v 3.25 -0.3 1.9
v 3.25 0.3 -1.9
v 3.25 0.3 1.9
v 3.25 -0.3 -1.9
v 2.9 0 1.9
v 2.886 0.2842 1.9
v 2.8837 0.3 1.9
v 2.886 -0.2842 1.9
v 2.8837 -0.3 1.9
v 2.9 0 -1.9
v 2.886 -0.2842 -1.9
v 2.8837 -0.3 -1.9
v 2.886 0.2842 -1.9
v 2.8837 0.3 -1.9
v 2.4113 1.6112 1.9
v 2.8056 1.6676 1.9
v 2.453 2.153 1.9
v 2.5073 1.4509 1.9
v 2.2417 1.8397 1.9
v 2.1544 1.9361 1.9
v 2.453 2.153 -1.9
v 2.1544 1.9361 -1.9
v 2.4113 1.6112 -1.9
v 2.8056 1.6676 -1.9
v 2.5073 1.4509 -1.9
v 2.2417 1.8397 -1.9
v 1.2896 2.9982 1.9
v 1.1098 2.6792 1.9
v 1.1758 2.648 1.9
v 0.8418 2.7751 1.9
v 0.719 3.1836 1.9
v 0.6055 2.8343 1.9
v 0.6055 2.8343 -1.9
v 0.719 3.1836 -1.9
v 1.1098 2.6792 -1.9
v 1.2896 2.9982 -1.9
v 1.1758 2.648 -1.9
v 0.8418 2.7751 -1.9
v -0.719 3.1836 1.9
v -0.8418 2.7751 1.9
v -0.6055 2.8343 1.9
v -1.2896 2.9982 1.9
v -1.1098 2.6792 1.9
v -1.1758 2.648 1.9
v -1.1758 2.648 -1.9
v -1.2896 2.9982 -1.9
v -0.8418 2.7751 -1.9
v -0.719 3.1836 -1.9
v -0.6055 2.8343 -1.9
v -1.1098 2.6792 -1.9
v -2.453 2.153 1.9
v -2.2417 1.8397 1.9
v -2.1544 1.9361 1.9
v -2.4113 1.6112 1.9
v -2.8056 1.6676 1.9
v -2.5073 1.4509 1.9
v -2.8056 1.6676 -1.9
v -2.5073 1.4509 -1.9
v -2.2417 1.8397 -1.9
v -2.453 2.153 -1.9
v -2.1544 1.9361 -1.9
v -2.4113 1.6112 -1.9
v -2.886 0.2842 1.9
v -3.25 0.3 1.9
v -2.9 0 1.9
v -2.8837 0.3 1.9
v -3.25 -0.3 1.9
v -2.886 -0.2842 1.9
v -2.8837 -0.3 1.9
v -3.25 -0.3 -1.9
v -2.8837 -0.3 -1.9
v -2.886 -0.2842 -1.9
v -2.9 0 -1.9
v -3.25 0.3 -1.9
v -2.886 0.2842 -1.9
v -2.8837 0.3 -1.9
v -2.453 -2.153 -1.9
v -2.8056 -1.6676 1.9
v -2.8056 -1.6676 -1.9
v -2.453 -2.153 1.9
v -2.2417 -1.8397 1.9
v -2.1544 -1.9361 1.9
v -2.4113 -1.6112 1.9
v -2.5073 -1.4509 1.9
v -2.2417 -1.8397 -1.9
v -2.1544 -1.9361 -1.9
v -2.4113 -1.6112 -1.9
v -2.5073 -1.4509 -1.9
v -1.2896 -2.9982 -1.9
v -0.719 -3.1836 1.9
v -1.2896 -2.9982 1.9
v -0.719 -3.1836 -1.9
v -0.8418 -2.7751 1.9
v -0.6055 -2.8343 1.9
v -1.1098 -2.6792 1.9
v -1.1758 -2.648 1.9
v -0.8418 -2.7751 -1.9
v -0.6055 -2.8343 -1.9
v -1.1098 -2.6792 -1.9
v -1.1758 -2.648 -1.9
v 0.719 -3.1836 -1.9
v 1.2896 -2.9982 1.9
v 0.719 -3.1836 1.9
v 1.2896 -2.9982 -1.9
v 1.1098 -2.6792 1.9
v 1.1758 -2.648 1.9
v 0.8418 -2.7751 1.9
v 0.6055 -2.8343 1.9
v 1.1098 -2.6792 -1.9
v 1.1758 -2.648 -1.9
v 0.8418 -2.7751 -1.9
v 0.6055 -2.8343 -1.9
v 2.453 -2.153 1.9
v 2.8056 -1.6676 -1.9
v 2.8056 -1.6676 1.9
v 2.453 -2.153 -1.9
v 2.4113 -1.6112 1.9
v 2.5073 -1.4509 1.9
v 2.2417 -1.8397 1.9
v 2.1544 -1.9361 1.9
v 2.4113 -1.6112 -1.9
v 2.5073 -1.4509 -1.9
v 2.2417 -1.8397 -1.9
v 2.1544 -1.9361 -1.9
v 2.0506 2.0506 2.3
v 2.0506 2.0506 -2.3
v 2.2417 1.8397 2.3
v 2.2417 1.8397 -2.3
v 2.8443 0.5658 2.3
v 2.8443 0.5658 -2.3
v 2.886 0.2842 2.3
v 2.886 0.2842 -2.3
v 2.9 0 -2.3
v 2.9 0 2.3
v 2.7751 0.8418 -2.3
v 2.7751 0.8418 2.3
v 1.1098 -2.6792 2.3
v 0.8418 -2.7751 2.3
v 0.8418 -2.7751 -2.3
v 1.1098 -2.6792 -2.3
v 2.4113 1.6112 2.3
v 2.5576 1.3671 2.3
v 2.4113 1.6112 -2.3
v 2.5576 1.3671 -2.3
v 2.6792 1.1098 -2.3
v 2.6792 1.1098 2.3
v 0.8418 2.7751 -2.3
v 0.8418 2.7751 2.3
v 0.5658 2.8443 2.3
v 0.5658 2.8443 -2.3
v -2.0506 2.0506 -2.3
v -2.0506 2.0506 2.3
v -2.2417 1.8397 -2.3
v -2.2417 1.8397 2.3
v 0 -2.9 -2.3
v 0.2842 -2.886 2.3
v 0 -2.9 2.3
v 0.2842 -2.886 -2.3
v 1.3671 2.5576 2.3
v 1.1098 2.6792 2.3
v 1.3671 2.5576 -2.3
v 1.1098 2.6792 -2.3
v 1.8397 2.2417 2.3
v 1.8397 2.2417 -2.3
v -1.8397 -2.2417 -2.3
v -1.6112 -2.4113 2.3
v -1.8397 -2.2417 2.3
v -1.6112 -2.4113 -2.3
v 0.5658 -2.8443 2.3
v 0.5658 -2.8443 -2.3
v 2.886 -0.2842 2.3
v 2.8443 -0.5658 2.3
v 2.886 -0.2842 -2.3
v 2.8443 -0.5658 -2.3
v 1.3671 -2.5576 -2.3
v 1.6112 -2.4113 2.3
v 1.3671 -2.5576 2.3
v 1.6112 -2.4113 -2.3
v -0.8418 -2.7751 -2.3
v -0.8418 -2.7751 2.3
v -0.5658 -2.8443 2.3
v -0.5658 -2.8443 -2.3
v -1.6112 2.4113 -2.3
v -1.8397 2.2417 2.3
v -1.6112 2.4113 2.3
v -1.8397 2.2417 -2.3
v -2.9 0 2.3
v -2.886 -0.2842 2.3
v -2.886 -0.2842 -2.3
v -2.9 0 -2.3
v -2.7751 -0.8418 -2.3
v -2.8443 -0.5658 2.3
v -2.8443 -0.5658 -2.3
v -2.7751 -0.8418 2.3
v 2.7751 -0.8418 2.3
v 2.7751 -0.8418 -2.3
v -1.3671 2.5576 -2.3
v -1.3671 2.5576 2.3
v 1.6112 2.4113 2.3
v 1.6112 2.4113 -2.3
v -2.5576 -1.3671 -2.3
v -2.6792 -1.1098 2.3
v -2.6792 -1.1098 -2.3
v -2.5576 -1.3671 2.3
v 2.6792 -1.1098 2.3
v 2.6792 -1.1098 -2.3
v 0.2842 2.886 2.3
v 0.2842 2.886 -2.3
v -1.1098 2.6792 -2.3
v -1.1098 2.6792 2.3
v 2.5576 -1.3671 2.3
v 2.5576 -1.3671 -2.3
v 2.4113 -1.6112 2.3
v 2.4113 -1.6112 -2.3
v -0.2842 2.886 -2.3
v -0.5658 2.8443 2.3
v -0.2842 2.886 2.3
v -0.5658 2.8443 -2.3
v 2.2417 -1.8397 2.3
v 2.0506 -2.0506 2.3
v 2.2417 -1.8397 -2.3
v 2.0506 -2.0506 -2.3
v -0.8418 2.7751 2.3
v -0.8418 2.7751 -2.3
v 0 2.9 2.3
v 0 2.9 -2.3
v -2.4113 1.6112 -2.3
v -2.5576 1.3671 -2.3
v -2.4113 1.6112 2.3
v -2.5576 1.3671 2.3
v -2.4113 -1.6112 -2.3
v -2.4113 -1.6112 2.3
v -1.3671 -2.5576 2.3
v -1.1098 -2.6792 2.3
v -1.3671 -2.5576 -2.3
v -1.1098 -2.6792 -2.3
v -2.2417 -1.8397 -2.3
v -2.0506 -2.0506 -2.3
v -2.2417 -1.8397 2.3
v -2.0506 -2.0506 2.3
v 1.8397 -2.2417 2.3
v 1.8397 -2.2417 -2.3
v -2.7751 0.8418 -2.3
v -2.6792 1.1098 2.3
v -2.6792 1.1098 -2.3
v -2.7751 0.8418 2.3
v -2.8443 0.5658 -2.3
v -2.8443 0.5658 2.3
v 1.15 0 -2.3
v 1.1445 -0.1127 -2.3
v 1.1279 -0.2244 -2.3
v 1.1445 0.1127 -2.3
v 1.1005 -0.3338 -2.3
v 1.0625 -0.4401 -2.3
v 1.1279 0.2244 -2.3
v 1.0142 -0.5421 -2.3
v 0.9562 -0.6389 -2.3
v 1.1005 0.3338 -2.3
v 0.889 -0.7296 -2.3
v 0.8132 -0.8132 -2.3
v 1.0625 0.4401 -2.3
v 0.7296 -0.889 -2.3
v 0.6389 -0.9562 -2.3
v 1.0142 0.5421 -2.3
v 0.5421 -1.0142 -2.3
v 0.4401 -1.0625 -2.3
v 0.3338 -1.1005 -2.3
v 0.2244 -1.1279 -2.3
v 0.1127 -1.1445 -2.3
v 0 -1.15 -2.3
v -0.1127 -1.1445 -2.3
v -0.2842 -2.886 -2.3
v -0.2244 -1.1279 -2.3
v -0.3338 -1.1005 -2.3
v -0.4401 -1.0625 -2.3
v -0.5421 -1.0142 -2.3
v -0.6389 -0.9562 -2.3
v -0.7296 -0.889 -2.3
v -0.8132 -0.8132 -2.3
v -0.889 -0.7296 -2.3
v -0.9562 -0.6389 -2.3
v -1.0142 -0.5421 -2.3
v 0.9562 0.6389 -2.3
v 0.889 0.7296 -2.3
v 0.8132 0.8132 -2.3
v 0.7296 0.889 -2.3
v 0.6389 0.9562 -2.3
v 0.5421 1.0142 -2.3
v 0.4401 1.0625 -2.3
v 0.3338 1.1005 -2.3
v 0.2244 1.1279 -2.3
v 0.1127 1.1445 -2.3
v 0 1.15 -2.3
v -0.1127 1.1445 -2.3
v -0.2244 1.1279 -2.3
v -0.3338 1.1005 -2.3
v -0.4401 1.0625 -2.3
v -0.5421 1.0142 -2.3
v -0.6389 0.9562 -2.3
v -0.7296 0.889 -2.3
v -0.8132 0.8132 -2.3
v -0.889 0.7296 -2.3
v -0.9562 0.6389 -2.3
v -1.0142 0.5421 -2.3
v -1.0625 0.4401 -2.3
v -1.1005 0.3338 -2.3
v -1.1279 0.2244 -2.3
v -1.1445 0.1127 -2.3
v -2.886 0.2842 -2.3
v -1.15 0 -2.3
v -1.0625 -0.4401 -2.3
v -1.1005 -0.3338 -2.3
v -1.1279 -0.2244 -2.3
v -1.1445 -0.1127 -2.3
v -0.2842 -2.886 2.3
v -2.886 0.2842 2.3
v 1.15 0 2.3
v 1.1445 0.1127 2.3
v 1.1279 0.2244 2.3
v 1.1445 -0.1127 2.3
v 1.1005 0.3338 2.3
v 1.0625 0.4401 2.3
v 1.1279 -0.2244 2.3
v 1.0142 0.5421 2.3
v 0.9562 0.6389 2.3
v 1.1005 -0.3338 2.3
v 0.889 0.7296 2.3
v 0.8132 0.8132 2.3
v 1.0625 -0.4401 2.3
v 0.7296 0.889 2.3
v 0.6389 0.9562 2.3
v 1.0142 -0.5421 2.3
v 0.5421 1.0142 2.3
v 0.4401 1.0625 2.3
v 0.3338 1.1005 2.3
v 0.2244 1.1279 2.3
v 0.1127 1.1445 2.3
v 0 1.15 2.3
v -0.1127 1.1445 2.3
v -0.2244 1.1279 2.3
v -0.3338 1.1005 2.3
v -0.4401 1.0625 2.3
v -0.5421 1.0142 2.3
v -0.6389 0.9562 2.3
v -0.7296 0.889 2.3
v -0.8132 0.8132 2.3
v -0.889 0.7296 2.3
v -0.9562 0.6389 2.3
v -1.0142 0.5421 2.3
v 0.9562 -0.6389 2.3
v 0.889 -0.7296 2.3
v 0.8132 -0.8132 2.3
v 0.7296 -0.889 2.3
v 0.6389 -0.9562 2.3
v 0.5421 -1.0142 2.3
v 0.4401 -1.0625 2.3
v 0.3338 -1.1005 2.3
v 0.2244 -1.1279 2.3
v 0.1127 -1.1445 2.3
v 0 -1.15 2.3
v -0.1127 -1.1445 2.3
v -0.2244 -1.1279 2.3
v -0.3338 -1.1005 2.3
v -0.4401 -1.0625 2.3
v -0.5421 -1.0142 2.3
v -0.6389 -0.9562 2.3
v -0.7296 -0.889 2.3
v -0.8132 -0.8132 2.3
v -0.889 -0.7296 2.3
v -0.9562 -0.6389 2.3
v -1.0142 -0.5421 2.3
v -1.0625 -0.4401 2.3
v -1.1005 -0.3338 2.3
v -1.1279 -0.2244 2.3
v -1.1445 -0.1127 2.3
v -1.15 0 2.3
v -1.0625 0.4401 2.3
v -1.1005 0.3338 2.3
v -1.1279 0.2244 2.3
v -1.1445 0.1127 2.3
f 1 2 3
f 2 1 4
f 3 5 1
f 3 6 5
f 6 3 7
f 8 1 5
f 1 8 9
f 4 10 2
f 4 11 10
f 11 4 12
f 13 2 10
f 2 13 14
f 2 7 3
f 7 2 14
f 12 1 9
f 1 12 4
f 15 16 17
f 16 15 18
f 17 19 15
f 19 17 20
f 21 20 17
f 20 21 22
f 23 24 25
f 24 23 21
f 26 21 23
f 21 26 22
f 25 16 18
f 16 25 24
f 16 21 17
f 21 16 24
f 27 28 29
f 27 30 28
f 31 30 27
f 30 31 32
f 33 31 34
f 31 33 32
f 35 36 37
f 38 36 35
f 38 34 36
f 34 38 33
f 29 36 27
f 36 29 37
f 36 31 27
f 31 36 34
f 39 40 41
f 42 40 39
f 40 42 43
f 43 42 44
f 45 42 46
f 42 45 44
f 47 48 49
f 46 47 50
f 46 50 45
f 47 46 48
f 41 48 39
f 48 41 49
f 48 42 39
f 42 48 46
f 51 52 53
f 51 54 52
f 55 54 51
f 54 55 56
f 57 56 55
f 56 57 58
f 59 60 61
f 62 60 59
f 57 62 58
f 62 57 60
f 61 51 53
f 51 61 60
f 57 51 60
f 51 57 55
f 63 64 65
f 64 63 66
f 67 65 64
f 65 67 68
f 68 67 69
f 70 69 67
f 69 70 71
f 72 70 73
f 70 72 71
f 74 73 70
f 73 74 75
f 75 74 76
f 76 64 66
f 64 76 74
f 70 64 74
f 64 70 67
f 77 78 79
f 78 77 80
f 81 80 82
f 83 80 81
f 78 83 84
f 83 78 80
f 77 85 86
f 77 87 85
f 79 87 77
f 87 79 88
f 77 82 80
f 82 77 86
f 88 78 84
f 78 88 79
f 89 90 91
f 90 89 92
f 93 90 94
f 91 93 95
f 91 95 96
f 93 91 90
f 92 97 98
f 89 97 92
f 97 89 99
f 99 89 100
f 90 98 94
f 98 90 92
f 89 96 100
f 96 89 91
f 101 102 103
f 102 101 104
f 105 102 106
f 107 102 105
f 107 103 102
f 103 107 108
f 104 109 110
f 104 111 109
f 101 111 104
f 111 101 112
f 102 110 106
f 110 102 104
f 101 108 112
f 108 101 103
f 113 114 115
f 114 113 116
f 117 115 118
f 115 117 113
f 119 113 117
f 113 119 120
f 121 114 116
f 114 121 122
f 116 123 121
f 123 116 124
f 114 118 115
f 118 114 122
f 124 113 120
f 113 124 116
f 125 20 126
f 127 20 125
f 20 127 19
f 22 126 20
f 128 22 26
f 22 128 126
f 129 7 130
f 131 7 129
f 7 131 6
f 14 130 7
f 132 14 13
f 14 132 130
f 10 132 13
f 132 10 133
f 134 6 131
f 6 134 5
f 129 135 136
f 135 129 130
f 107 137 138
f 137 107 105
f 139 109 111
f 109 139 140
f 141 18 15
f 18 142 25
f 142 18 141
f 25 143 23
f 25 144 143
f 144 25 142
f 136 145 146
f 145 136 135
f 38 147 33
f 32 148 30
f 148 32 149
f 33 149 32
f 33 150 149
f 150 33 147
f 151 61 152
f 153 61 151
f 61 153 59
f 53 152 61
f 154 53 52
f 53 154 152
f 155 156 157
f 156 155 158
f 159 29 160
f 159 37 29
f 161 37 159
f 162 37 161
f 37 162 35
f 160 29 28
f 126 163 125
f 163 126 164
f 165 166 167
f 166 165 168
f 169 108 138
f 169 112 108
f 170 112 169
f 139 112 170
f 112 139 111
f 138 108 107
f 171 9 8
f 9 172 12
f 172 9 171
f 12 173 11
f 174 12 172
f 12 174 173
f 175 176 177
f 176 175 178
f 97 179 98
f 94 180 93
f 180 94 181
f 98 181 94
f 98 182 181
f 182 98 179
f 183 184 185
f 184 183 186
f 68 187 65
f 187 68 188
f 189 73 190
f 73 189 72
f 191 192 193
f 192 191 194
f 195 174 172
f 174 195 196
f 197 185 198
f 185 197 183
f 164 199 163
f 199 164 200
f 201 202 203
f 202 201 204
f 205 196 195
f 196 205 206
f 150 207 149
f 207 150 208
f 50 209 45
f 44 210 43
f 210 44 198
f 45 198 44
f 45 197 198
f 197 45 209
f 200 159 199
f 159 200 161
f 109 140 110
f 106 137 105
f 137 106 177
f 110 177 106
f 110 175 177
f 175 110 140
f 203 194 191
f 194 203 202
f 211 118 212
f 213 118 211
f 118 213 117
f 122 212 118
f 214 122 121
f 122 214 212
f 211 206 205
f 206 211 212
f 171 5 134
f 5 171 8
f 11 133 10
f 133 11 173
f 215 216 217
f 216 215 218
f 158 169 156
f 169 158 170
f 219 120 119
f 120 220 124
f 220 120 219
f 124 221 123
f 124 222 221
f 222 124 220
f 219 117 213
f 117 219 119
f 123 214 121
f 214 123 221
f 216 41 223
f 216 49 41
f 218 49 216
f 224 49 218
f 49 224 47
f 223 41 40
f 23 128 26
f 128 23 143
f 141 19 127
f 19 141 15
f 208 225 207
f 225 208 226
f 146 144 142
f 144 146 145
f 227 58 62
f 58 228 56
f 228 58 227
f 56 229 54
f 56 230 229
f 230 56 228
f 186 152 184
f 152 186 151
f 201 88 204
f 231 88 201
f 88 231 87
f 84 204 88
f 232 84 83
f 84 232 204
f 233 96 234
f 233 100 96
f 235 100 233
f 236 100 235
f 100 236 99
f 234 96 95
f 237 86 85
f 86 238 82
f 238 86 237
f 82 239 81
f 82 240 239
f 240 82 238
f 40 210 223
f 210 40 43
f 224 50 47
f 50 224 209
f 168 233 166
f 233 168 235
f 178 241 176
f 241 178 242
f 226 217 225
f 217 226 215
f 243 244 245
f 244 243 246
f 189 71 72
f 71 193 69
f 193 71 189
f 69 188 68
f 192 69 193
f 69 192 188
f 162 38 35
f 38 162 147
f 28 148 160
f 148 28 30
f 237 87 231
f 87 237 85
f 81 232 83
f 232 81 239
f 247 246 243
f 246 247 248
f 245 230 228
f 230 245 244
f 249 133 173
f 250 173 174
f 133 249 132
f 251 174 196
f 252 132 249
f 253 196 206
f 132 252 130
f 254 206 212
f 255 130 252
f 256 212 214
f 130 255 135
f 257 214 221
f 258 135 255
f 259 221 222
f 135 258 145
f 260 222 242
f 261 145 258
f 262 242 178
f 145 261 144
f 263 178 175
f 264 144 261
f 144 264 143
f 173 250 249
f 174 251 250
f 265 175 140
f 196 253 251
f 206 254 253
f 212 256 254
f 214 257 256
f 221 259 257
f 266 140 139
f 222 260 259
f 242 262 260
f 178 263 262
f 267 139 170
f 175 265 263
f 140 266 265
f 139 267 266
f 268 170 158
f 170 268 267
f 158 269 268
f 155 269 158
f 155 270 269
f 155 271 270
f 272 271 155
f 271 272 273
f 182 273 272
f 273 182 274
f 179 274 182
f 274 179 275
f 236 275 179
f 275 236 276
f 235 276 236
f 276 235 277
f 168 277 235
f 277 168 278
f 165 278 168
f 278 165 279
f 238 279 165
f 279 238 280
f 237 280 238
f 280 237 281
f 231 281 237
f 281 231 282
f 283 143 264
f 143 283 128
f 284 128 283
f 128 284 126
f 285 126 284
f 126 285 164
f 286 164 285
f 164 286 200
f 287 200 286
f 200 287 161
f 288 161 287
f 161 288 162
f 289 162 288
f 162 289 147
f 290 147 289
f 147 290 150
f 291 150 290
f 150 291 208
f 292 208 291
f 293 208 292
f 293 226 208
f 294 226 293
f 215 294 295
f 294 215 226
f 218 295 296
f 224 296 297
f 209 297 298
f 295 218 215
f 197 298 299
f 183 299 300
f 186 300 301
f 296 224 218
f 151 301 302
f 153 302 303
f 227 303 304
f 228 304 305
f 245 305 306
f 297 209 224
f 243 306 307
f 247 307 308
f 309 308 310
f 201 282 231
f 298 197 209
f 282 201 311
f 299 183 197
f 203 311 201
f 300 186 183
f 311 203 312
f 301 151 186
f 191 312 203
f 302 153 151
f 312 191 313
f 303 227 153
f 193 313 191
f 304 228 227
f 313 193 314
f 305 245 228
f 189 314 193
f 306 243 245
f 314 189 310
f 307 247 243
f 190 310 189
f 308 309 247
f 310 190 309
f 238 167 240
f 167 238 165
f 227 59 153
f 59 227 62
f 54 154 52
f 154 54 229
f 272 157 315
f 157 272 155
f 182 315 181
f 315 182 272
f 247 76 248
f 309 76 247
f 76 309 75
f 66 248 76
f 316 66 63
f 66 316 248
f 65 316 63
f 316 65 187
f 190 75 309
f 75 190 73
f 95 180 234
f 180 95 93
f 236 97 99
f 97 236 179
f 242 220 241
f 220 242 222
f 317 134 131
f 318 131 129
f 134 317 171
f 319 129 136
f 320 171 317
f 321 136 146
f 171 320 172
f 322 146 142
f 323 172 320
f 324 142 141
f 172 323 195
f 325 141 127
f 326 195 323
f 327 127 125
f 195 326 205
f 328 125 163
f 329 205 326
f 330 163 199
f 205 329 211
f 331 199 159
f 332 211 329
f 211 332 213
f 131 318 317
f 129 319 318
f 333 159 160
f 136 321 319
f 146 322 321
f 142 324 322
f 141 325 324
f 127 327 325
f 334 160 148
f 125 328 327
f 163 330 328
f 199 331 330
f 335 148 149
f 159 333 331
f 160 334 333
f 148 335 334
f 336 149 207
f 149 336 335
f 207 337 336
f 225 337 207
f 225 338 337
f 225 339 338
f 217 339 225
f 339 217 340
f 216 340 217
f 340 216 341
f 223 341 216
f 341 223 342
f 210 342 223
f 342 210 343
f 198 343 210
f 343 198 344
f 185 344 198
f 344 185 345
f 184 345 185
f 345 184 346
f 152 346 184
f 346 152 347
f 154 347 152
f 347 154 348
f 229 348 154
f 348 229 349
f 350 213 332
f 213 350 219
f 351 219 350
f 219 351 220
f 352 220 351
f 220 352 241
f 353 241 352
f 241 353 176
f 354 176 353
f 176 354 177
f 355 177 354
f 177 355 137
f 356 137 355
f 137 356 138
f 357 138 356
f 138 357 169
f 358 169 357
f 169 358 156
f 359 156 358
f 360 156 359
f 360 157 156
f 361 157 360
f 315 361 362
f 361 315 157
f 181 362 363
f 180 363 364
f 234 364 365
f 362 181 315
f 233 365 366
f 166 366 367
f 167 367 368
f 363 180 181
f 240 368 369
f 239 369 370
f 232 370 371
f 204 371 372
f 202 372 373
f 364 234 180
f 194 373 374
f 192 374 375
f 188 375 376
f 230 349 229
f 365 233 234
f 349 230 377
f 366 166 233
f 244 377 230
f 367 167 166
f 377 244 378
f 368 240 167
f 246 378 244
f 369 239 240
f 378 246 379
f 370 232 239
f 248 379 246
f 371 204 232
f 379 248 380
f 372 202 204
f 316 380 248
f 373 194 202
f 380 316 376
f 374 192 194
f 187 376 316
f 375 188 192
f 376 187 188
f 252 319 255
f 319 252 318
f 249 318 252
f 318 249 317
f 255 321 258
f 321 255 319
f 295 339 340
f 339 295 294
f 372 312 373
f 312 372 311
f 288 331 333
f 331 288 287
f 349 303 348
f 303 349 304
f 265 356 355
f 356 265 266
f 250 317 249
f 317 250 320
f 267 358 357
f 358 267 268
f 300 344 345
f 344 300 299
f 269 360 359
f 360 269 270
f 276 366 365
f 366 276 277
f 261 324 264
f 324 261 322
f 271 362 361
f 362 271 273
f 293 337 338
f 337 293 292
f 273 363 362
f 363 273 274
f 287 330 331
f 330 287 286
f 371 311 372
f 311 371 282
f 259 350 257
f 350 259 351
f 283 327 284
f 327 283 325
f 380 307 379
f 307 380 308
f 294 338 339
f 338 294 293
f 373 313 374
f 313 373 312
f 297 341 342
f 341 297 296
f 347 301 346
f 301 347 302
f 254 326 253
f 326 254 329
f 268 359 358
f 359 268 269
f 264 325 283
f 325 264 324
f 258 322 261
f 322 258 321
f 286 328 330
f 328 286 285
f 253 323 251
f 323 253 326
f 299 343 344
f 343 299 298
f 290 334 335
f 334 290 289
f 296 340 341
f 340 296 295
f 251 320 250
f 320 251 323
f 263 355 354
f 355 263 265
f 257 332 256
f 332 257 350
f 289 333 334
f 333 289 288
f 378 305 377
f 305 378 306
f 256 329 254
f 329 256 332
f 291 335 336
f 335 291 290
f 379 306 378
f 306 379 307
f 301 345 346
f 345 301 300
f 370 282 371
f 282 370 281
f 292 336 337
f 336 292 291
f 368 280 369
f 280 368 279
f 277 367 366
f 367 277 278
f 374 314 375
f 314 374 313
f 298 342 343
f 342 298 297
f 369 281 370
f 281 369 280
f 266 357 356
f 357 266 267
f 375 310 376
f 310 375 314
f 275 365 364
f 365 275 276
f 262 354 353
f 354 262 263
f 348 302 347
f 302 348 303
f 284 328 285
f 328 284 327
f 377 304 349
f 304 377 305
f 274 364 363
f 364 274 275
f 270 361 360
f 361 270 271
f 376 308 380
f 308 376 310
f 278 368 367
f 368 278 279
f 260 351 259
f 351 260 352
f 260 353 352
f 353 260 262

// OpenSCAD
// Parameters
screw_nominal_diameter_mm = 2.5; //[1.25:5:0.05]
internal_thread_pitch_mm = 0.45; //[0.2:1:0.01]
outer_diameter_mm = 5.8; //[2.9:11.6:0.1]
length_mm = 4.6; //[2.3:9.2:0.1]
lead_in_chamfer_mm = 0.3; //[0.1:1:0.05]
internal_thread_minor_diameter_mm = 2.1; //[1.2:3:0.05]
internal_hole_clearance_mm = 0.1; //[0:0.3:0.01]
ridge_count = 10; //[6:24:1]
ridge_depth_mm = 0.35; //[0.15:0.8:0.05]
ridge_width_mm = 0.6; //[0.3:1.2:0.05]
ridge_overlap_mm = 0.8; //[0.5:2:0.1]
ridge_end_margin_mm = 0.4; //[0.2:1.2:0.05]
eps_mm = 0.2; //[0.05:0.5:0.05]

// Module for the heat-set insert body
module heat_set_insert_body() {
  color("Gold") {
    cylinder(r=outer_diameter_mm/2, h=length_mm, center=true, $fn=64);
  }
}

// Module for the internal thread representation
module internal_thread_for_M2_5() {
  color("Silver") {
    cylinder(r=internal_thread_minor_diameter_mm/2 + internal_hole_clearance_mm, 
             h=length_mm + 2*eps_mm, center=true, $fn=64);
  }
}

// Module for the lead-in chamfer
module lead_in_chamfer() {
  color("Gold") {
    translate([0, 0, -length_mm/2 + lead_in_chamfer_mm/2])
      cylinder(r1=outer_diameter_mm/2, r2=outer_diameter_mm/2 - lead_in_chamfer_mm, 
               h=lead_in_chamfer_mm, center=true, $fn=64);
  }
}

// Module for a single ridge
module outer_ridge_proto() {
  translate([outer_diameter_mm/2 + (ridge_depth_mm + ridge_overlap_mm)/2 - ridge_overlap_mm, 0, 0])
    cube([ridge_depth_mm + ridge_overlap_mm, ridge_width_mm, length_mm - 2*ridge_end_margin_mm], center=true);
}

// Module for all ridges
module outer_knurl_or_ridges_for_heat_set_retention() {
  for (i = [0:ridge_count-1]) {
    rotate([0, 0, i*360/ridge_count]) outer_ridge_proto();
  }
}

// Module for the complete insert
module insert() {
  union() {
    heat_set_insert_body();
    outer_knurl_or_ridges_for_heat_set_retention();
    lead_in_chamfer();
  }
}

// Module for the threaded insert
module threaded_insert() {
  difference() {
    insert();
    internal_thread_for_M2_5();
  }
}

// Assembly
module assembly() {
  threaded_insert();
}

assembly();
